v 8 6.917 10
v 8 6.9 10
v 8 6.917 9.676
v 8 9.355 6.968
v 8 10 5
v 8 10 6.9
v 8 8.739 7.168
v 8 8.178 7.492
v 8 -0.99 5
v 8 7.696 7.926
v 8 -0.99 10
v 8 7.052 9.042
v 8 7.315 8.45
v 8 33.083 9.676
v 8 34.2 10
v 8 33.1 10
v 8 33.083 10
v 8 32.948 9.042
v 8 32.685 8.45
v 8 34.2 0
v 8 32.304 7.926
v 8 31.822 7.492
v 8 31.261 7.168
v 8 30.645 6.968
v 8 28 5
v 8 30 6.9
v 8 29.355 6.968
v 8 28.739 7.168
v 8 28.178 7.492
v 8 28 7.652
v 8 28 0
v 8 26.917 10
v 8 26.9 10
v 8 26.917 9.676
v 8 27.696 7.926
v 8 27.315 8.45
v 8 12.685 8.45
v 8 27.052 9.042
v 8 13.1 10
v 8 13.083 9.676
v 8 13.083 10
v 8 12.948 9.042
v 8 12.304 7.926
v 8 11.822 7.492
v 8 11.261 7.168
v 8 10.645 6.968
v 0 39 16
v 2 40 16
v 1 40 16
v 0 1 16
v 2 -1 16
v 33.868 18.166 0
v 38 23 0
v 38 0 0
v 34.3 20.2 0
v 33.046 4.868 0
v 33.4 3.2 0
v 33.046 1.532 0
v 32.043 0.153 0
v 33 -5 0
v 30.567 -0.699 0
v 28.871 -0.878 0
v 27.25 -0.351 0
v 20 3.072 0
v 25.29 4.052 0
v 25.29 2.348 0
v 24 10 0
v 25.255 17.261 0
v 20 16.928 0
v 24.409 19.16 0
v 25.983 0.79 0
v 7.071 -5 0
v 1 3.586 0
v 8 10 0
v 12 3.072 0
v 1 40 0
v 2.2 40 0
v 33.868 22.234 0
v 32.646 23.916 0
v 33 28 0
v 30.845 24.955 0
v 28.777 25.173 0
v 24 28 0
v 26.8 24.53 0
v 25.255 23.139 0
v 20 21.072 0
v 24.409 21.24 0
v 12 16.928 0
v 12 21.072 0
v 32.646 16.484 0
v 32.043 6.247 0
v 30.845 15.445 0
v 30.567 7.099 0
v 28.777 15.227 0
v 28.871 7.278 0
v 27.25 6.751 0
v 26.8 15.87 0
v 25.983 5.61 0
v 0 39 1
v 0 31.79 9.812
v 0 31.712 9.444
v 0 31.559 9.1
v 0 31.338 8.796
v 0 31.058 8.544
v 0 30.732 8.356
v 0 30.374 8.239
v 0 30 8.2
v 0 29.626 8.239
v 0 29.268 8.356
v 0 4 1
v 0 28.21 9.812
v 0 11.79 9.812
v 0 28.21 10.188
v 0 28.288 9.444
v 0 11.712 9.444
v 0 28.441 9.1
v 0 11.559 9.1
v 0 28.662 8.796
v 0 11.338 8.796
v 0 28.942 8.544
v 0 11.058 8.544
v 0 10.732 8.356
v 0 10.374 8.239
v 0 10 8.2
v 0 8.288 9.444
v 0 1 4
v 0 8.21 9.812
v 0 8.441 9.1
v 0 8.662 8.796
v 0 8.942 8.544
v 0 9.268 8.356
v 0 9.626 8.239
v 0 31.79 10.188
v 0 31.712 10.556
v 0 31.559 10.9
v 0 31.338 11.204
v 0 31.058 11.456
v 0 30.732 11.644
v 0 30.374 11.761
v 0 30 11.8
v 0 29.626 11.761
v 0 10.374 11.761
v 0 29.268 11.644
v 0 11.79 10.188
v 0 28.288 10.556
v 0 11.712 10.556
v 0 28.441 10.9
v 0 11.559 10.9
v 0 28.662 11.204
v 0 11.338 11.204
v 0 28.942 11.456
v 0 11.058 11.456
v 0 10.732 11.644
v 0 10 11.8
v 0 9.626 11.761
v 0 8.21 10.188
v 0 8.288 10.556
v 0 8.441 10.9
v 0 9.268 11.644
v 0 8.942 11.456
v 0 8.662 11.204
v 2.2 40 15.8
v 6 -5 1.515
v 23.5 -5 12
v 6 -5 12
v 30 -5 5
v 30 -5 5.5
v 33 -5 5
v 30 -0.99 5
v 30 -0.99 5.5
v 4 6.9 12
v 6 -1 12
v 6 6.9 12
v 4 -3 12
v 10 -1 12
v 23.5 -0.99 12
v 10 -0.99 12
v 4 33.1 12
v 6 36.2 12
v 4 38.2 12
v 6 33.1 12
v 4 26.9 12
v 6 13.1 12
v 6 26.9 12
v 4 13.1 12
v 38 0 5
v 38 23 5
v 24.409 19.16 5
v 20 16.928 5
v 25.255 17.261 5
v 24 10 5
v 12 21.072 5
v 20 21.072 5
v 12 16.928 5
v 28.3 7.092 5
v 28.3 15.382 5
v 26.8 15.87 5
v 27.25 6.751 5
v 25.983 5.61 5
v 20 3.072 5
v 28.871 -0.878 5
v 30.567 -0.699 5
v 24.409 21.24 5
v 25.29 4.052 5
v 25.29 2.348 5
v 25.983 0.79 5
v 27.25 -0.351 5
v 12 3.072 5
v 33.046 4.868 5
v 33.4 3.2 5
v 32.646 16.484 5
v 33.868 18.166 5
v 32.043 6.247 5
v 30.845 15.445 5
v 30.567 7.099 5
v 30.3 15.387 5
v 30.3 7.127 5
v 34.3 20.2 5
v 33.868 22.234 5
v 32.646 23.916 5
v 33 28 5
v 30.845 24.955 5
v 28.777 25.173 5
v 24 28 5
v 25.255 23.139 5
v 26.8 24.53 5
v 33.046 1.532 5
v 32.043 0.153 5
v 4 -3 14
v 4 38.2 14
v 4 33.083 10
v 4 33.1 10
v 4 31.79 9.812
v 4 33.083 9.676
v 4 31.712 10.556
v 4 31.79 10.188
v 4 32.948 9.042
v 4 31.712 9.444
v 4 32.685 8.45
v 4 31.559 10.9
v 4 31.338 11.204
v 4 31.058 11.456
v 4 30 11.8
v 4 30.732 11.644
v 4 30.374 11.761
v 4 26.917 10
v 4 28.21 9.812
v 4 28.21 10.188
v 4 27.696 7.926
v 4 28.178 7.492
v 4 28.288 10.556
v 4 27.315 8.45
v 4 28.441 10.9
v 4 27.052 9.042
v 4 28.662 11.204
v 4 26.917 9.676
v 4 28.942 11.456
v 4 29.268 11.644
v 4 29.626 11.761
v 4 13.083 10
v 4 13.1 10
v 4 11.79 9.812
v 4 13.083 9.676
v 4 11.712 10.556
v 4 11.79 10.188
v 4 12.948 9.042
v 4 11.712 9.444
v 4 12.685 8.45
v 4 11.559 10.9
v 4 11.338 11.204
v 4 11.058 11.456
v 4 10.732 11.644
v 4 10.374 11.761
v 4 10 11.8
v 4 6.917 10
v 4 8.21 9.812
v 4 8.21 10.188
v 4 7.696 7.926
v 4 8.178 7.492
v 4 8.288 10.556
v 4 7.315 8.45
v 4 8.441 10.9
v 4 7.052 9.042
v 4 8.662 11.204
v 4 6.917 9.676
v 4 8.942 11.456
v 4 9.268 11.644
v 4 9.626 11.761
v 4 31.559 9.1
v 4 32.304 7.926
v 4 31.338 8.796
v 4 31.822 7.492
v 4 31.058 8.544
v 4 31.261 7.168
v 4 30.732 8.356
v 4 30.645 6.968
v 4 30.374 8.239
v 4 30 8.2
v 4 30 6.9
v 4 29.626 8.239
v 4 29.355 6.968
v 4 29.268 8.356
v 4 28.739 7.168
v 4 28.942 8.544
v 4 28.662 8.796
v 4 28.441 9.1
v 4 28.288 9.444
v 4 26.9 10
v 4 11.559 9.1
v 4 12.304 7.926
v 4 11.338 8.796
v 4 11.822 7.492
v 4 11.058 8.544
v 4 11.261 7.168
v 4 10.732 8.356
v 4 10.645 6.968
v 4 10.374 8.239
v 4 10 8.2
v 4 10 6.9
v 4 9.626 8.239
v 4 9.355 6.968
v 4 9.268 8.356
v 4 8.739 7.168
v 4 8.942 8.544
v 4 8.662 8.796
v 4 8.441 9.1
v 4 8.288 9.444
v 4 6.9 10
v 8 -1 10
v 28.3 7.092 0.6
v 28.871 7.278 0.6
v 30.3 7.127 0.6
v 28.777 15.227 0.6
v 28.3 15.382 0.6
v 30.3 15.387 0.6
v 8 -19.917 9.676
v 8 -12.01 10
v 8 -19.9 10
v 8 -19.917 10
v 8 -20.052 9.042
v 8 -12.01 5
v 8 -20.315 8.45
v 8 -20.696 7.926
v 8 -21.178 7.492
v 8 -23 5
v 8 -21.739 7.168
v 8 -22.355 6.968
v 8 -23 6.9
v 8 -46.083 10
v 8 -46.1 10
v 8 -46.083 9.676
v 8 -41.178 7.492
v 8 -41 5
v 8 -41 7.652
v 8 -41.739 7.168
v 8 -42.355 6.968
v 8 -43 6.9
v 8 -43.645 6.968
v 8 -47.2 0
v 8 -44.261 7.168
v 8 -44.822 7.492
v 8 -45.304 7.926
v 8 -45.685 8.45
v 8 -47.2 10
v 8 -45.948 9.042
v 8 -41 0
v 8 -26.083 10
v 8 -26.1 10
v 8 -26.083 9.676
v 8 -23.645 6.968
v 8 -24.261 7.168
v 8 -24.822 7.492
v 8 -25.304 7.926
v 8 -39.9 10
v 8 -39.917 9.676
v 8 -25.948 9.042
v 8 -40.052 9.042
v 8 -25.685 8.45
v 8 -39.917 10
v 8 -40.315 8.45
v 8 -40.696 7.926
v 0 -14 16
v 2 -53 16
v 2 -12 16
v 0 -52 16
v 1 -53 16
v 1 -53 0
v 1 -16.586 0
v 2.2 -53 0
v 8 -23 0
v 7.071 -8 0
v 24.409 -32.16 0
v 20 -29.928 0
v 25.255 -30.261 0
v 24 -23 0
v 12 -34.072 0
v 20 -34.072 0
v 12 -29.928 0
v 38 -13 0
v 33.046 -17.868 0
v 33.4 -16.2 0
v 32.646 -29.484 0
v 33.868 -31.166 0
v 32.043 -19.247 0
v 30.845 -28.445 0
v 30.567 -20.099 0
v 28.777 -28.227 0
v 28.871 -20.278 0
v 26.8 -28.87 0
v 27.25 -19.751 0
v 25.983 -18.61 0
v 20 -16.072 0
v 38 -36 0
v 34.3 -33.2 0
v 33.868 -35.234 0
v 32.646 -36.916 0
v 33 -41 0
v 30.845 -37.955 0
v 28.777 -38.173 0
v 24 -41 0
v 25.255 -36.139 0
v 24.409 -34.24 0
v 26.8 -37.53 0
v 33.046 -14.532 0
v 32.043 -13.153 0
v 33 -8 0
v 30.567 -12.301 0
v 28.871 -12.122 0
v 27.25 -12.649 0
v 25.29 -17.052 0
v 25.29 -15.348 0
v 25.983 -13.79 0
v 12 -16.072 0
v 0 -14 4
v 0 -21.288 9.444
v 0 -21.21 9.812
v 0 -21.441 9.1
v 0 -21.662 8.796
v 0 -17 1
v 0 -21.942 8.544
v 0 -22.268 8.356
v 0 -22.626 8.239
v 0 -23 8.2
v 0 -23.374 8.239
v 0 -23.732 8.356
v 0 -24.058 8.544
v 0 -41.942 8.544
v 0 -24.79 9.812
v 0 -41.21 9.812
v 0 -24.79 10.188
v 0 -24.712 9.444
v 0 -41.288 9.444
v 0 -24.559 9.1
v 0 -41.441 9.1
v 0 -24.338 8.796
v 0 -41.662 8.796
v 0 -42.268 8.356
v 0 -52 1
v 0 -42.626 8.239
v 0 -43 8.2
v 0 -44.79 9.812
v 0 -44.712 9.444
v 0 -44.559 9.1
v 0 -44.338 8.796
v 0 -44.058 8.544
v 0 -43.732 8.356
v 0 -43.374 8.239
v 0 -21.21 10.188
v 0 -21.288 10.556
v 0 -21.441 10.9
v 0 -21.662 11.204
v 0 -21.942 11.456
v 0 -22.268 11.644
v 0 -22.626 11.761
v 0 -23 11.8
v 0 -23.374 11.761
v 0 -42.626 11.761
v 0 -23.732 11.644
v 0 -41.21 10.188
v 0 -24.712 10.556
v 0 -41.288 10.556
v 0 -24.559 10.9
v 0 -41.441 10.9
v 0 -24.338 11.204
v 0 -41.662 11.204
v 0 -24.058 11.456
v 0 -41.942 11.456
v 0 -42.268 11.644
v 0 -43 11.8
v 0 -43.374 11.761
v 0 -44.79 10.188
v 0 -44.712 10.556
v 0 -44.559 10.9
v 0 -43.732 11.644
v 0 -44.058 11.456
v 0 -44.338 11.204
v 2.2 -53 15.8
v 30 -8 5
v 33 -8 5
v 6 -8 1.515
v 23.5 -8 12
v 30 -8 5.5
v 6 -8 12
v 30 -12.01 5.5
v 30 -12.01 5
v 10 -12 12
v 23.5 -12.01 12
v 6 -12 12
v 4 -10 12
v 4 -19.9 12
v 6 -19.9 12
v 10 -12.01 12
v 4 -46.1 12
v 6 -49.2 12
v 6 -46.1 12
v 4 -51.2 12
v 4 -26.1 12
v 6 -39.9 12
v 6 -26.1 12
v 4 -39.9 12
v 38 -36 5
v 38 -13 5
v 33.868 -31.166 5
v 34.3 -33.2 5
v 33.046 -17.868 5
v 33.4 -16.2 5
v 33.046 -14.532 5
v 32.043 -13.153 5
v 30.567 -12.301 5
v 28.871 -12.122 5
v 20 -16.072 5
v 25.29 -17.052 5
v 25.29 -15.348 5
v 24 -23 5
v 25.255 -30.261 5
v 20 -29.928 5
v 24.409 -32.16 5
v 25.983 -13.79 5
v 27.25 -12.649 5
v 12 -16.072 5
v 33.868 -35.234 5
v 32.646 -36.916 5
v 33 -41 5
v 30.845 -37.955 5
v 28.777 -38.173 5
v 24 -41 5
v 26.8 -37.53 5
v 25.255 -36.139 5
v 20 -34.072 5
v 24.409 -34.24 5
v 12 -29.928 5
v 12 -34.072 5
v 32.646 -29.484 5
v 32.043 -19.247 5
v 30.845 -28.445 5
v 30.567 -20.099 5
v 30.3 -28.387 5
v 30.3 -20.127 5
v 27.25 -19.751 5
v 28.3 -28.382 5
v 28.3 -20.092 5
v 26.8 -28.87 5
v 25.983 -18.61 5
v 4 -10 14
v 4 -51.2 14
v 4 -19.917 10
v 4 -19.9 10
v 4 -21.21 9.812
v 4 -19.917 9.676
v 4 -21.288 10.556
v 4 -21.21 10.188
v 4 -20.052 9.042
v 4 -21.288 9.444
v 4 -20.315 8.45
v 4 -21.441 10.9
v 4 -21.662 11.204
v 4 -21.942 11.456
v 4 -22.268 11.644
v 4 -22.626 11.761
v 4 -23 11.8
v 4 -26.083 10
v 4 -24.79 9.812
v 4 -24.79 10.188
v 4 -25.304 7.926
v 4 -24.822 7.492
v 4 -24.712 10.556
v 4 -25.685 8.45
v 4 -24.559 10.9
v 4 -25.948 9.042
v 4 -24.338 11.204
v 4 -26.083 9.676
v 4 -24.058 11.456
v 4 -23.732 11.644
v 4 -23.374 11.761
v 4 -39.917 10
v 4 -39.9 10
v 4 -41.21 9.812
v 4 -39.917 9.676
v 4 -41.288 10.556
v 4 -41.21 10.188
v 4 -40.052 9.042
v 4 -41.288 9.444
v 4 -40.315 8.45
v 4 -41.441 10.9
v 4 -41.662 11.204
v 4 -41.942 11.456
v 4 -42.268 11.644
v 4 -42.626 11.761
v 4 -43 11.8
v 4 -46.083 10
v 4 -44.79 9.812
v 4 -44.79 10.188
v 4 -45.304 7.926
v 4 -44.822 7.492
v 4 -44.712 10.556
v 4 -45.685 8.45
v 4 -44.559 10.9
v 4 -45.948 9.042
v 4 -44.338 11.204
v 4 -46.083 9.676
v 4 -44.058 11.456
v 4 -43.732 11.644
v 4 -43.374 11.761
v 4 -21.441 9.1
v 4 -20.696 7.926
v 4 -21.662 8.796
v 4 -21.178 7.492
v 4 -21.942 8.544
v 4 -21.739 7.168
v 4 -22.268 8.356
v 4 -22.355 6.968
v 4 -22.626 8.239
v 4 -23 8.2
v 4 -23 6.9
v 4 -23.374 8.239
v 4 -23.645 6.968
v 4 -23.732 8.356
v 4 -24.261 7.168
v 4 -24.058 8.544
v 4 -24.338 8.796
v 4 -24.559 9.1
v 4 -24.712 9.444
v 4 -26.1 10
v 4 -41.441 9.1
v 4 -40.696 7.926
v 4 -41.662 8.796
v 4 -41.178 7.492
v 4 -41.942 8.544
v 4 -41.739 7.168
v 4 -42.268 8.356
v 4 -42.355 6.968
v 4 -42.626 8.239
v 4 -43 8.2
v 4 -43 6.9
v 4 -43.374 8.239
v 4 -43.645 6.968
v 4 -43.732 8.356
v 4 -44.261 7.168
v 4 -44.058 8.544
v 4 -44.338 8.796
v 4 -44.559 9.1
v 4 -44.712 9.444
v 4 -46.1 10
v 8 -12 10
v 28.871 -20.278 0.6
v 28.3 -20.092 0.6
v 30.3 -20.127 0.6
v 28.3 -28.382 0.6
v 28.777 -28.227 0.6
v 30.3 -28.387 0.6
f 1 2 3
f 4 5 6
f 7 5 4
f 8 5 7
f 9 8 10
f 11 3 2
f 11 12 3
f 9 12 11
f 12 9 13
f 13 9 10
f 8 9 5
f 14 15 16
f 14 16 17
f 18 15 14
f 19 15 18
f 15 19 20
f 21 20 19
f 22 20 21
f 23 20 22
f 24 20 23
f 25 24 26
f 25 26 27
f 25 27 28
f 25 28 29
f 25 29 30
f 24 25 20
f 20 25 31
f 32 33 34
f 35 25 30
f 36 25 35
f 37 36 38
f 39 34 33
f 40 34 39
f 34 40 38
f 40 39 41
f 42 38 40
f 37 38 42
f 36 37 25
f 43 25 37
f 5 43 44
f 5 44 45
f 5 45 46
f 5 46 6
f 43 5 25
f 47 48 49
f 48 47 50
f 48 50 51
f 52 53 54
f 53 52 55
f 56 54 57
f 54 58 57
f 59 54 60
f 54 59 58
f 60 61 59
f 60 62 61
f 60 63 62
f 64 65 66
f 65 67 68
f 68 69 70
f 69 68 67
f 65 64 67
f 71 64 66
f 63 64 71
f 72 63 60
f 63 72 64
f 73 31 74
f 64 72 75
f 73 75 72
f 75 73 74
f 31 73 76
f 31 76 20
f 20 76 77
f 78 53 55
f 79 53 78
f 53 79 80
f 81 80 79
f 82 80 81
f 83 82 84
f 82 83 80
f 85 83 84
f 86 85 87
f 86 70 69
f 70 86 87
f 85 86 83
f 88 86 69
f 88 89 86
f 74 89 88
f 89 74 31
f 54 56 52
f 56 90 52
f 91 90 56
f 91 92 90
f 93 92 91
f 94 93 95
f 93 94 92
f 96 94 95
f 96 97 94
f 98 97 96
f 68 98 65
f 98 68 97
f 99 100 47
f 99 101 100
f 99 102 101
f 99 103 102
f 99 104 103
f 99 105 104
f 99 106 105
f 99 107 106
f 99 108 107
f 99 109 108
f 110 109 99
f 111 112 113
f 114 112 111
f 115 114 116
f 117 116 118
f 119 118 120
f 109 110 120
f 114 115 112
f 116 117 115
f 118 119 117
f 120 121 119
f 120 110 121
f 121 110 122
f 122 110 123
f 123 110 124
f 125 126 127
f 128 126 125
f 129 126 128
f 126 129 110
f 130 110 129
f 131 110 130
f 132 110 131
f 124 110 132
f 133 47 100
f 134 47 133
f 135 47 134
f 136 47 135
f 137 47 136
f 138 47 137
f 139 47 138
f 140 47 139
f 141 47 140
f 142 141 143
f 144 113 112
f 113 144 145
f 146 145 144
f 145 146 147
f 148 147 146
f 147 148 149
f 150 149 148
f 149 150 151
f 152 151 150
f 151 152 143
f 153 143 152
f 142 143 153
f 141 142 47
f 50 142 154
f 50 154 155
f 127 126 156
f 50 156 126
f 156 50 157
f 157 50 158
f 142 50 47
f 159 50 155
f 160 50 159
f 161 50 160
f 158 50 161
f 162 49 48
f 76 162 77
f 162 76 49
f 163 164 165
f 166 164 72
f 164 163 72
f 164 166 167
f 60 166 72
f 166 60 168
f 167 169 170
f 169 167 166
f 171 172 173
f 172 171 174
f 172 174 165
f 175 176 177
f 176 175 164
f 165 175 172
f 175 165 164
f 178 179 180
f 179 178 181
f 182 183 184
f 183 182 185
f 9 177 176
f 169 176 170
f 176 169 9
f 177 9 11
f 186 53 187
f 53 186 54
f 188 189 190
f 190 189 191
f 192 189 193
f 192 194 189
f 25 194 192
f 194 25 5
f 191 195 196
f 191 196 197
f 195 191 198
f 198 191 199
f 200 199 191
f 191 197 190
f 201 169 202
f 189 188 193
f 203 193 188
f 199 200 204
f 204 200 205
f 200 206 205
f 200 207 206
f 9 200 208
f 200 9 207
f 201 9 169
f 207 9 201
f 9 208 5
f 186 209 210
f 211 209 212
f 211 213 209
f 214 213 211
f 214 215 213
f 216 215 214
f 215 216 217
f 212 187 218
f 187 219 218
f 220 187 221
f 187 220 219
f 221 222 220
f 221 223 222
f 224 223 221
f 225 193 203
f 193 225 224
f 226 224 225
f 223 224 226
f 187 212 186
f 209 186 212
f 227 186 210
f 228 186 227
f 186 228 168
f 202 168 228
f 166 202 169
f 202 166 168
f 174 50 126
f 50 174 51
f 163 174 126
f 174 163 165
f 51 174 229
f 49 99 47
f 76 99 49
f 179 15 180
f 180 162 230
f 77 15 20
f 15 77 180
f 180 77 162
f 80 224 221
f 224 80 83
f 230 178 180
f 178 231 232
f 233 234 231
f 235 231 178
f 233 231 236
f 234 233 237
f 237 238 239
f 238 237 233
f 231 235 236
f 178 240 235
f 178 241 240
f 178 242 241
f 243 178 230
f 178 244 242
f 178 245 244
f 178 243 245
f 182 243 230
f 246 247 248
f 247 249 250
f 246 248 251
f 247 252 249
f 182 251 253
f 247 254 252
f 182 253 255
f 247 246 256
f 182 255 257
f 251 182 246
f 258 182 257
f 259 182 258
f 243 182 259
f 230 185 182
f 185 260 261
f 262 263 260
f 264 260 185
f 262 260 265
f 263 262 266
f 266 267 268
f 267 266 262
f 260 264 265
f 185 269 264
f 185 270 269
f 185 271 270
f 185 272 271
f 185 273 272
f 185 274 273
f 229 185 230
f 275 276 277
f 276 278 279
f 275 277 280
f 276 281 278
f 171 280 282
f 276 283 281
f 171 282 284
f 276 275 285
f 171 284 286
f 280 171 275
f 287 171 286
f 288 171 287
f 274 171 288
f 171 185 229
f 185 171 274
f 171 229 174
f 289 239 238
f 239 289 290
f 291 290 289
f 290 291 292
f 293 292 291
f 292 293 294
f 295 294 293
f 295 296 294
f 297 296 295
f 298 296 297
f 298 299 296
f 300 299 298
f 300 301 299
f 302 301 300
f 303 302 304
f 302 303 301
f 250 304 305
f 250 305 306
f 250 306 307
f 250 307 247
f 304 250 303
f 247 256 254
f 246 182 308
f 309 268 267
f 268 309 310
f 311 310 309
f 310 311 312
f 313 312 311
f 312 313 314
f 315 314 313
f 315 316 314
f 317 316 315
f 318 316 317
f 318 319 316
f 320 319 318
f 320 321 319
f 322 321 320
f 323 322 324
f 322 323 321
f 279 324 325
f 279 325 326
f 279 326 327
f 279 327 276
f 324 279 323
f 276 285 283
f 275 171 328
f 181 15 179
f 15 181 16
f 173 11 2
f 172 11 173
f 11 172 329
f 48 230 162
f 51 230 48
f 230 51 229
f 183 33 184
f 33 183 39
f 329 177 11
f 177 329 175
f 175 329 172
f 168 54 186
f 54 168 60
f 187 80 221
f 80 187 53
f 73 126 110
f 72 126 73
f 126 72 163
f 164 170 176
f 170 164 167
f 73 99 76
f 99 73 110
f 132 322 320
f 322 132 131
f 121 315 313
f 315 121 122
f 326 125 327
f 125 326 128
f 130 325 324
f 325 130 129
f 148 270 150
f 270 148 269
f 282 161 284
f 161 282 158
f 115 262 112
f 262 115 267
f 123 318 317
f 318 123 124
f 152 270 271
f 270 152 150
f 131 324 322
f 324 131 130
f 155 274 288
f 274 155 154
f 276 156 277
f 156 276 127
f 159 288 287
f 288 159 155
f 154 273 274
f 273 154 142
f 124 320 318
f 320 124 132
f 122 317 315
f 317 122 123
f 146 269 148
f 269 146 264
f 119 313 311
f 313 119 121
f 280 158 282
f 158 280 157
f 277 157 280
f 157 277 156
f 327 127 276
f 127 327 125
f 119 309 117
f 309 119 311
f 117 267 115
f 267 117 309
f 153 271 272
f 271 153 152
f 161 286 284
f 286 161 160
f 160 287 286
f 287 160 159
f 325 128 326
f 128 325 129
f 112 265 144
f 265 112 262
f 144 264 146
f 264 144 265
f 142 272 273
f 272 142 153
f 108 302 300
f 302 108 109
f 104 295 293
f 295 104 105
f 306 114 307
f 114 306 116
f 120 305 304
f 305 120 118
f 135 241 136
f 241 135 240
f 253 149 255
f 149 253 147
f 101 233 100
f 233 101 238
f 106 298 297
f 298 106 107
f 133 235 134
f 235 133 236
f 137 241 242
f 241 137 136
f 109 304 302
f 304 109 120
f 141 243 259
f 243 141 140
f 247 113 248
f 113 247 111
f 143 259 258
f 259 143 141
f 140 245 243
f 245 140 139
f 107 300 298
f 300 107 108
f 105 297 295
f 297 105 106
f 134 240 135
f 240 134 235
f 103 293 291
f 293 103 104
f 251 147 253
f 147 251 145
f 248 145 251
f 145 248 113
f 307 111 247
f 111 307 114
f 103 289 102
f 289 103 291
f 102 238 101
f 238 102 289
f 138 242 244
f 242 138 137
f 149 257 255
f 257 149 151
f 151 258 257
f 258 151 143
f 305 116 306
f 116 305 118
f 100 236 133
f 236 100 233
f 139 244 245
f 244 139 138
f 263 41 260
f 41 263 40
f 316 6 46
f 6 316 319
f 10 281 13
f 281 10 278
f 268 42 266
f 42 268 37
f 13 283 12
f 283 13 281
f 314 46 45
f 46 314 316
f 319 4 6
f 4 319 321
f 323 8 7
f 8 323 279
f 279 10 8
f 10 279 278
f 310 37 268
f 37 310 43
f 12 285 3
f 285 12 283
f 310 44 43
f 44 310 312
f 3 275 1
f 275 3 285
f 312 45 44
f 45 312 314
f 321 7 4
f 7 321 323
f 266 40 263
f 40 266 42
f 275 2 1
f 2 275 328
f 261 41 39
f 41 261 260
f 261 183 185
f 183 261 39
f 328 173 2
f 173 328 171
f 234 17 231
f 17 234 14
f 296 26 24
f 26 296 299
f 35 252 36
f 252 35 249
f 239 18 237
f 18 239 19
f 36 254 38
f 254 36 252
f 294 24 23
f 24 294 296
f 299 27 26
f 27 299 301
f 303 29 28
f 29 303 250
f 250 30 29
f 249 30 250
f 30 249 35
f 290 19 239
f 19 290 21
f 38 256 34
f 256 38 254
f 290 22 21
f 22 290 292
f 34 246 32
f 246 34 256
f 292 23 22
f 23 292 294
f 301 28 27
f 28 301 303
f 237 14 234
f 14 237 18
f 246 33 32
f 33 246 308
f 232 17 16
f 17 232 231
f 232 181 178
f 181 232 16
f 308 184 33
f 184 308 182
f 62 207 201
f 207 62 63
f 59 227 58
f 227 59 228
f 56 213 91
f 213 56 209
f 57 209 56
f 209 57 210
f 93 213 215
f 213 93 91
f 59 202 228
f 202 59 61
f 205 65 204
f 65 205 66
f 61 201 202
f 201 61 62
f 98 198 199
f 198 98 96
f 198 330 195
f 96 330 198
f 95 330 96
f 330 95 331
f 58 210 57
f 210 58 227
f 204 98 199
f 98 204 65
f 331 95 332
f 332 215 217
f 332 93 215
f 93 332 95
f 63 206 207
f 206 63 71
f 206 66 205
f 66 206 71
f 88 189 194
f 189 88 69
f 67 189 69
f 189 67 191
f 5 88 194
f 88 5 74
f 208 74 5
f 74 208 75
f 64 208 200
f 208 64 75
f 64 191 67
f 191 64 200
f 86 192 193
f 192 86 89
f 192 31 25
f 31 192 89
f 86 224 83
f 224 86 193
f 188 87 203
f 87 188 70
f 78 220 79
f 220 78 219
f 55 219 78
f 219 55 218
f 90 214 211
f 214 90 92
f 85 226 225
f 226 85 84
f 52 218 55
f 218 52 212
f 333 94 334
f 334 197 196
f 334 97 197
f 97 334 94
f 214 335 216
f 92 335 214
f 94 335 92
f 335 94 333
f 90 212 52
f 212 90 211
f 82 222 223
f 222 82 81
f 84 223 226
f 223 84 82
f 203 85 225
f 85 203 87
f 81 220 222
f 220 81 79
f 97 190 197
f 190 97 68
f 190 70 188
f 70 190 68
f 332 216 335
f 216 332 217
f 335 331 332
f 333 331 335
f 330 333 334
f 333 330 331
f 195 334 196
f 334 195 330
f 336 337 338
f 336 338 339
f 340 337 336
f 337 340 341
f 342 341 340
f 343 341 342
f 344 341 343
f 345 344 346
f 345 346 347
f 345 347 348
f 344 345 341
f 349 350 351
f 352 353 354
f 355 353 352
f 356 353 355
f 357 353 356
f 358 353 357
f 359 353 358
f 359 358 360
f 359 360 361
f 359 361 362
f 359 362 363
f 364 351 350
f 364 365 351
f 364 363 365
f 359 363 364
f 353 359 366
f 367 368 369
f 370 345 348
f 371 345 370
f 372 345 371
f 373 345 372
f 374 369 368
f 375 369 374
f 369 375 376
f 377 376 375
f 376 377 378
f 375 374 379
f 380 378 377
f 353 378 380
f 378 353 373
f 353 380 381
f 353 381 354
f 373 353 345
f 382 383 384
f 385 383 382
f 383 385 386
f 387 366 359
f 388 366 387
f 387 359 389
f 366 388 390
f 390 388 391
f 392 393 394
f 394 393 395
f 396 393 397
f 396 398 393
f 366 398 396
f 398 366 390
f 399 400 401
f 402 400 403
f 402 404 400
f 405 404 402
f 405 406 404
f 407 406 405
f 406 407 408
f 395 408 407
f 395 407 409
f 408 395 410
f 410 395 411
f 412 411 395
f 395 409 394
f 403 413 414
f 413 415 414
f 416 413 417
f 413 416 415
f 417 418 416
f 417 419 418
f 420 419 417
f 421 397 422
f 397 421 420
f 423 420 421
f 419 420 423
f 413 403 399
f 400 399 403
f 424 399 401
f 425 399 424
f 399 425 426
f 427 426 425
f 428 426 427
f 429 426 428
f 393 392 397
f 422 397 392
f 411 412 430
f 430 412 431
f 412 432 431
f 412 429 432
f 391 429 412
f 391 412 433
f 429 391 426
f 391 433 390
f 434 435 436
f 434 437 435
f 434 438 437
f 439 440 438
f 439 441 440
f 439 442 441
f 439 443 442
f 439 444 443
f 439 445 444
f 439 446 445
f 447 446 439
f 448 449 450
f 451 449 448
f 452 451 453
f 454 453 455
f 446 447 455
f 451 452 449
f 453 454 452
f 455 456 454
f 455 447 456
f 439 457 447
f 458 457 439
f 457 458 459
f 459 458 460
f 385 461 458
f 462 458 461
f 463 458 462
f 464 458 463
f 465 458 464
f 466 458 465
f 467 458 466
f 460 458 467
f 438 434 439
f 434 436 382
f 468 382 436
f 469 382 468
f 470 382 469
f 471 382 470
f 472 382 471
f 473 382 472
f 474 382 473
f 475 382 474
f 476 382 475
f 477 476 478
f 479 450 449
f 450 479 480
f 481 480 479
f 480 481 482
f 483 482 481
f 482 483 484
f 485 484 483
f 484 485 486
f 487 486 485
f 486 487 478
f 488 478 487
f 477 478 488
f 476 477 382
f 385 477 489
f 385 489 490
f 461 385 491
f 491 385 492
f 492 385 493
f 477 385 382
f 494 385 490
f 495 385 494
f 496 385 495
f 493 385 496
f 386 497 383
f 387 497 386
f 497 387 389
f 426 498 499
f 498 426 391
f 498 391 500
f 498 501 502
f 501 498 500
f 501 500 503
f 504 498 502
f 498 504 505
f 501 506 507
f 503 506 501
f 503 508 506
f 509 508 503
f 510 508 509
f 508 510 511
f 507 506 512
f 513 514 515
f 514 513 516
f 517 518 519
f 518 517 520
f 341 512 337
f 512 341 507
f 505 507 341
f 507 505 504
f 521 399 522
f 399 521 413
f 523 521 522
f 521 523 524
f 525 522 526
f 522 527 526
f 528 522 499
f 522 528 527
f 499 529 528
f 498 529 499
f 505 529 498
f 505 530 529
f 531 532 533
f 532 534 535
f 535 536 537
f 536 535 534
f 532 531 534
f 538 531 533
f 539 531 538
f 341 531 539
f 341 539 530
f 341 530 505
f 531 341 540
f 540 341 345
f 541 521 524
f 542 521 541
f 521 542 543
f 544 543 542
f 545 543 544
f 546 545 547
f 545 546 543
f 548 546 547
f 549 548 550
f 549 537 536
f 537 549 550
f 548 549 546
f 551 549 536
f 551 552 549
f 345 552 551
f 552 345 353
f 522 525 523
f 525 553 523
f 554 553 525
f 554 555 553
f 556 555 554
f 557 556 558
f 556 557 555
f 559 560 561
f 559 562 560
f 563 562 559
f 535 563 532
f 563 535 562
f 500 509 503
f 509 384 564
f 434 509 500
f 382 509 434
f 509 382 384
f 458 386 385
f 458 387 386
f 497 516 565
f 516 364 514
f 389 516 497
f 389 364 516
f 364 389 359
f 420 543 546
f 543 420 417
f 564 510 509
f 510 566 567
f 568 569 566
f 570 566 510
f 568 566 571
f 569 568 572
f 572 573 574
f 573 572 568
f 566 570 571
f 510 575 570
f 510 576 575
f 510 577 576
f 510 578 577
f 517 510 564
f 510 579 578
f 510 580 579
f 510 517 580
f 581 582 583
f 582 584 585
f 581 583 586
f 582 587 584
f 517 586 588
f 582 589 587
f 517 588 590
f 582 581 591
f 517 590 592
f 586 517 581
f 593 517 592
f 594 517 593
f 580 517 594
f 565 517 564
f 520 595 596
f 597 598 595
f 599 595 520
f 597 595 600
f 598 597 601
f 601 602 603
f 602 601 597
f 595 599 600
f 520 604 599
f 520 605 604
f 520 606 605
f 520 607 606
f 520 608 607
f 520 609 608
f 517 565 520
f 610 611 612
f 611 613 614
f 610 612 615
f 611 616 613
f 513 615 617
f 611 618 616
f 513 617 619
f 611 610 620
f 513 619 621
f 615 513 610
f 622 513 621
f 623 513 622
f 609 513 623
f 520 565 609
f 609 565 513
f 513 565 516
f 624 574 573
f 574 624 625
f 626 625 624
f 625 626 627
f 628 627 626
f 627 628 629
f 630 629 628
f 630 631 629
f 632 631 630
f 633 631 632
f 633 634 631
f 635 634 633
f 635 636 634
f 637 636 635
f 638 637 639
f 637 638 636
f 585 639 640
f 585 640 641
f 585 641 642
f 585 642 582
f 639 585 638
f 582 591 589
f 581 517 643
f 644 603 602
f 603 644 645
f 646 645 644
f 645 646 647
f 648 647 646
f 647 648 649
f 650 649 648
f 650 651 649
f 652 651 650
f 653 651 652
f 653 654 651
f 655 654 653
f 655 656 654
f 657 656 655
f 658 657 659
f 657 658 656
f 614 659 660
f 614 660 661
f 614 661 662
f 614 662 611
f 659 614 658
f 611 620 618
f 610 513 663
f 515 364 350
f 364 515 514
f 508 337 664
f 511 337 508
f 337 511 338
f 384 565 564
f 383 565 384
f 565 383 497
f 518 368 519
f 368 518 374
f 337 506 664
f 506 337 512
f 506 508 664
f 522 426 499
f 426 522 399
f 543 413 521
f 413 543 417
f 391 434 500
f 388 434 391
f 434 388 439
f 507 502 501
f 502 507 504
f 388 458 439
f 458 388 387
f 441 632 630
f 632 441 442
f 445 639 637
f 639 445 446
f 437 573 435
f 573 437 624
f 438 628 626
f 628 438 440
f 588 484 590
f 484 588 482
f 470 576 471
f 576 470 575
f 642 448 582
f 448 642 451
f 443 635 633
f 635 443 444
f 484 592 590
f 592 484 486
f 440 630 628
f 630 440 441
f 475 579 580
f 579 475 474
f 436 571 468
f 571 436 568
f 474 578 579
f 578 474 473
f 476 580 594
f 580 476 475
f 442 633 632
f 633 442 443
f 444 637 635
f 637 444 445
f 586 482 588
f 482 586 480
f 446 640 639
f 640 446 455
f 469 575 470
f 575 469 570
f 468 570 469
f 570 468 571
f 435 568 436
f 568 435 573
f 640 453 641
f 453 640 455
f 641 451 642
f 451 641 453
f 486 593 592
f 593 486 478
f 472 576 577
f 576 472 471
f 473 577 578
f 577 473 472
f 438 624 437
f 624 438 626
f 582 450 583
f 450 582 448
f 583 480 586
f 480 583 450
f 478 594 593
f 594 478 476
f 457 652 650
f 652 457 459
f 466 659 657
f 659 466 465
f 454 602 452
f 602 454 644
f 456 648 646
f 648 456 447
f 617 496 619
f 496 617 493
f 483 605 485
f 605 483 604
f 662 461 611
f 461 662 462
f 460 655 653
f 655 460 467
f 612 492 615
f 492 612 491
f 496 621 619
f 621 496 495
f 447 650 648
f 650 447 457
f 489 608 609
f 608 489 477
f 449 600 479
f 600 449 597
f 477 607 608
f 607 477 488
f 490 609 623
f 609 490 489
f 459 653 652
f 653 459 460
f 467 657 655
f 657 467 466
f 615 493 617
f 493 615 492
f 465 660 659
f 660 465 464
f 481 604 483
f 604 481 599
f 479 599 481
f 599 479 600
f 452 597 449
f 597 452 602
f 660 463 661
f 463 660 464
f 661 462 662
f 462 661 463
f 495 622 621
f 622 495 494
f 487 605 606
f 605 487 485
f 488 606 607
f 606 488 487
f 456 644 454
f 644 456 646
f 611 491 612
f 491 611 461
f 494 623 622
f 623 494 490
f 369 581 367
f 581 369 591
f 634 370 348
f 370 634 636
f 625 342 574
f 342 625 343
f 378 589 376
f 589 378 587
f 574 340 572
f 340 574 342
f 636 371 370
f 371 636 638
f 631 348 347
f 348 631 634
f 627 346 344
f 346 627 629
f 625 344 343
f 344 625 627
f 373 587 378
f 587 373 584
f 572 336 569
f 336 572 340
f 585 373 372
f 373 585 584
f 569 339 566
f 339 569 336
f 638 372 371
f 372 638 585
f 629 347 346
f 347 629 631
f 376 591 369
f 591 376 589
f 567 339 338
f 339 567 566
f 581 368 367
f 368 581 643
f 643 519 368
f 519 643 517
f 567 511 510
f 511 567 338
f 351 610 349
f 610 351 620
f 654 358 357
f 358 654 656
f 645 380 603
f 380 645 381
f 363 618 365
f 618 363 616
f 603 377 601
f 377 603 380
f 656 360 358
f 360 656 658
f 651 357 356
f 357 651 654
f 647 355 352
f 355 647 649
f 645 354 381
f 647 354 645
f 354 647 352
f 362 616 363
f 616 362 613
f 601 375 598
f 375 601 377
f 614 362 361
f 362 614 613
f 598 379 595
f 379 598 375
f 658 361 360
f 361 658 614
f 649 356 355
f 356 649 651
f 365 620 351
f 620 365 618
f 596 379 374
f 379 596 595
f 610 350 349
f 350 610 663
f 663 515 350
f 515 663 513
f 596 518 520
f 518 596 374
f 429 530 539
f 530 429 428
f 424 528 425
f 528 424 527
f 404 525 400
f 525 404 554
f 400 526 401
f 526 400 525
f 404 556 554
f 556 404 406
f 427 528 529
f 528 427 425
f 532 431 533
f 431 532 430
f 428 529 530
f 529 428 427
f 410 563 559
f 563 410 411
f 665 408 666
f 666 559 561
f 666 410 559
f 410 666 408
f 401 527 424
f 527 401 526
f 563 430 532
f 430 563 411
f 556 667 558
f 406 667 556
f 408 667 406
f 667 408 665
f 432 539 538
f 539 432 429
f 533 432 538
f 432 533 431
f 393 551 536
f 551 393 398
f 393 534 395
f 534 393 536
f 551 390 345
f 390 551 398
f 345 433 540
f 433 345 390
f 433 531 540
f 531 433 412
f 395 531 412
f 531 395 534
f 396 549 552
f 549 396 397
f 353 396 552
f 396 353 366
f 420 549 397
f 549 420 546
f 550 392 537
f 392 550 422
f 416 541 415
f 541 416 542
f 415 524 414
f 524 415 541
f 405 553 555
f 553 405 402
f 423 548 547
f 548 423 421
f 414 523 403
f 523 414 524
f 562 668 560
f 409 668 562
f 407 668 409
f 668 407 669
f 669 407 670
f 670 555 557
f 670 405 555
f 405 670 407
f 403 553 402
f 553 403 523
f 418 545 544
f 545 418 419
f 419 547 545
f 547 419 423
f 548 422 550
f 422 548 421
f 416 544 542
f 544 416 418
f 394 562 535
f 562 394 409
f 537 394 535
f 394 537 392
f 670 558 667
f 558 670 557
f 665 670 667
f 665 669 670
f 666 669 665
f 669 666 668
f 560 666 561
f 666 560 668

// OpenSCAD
// PRUSA iteration3
// Z axis top holder
// GNU GPL v3
// Josef Průša <iam@josefprusa.cz> and contributors
// http://www.reprap.org/wiki/Prusa_Mendel
// http://prusamendel.org


module z_top_base(){
 translate([0,-5,0]) cube([8,45,16]); // plate touching the base
 translate([0,-5,0]) cube([30,4.01,12]); // plate touching the base
 translate([0,-5,0]) cube([38,45,5]); // plate touching the base   
}

module z_top_fancy(){
 // Corner cutouts
 translate([0.5,0.5,0])         rotate([0,0,-45-180]) translate([-15,0,-1]) cube([30,30,51]);    
 translate([0.5,40-0.5,0])      rotate([0,0,-45+90])  translate([-15,0,-1]) cube([30,30,51]);  
 
    
 translate([-13,40+5+10.2,0])   rotate([0,0,-45-0])   translate([0,0,-1])   cube([30,30,51]); // frame side angle
 translate([8,28,0]) translate([0,0,-1]) cube([50,50,51]);       

 translate([4,0,12]) rotate([0,0, 0])    translate([0,-5,0]) cube([30,50,30]);          
 translate([6,0,12]) rotate([0,-45, 0])  translate([0,-5,0]) cube([30,50,30]);
 translate([8,4,10]) rotate([0,-45, 0])  translate([0,-5,0]) cube([30,50,30]);

 translate([38-2.5,-5+2.5,0])   rotate([0,0,-45-90]) translate([-15,0,-1]) cube([30,30,51]);         
 translate([35,26,0])           rotate([0,0,-45])    translate([-15,0,-1]) cube([30,30,51]); // outer corner
 translate([0,0,5])             rotate([45+180,0,0]) rotate([0,0,-45+90])  translate([0,0,-15]) cube([30,30,30]);

 // Stiffner cut out
 translate([30,0,5.5]) rotate([0,-45,0]) translate([0,-5,0]) cube([30,50,30]);
 //easy cleanup fix
 translate([0.5,0,0.5]) rotate([0,45,0]) translate([-2.5,0,-5]) cube([5,40,5]);
}

module z_top_holes(){
     // Screw holes frame
     translate([-1,10,10])      rotate([0,90,0]) cylinder(h = 20, r=1.8, $fn=30);
     translate([-1,10+20,10])   rotate([0,90,0]) cylinder(h = 20, r=1.8, $fn=30);
    

    // Screw heads
    translate([4,10,10]) rotate([0,90,0]) cylinder(h = 20, r=3.1, $fn=30);
    translate([4,10-3.1,10]) cube([10,6.2,10]);
    translate([4,10+20,10])  rotate([0,90,0]) cylinder(h = 20, r=3.1, $fn=30);
    translate([4,10+20-3.1,10]) cube([10,6.2,10]);

    // Z rod holder
    translate([25+4.3,3.2,-1]) rotate([0,0,0]) cylinder(h = 50, r=4.1, $fn=15);

    
    
    // odlehceni A
    translate([16,10,-1]) rotate([0,0,0]) cylinder(h = 50, r=8, $fn=6); // odlehceni
    translate([16,28,-1]) rotate([0,0,0]) cylinder(h = 50, r=8, $fn=6); // odlehceni
    
    translate([25+4.3,3.2+17,-1]) rotate([0,0,0]) cylinder(h = 50, r=5, $fn=15); // screw hole

    translate([25+4.3-1,3,0.6]) cube([2,15,7]); // it's bit up because it helps with printing
 
}

module z_top_right(){
    difference(){
        z_top_base();
        z_top_fancy();
        z_top_holes();
    }
}

module z_top_left(){
    translate([0,-13,0]) mirror([0,1,0]) 
    difference(){
        z_top_base();
        z_top_fancy();
        z_top_holes();
    }
}

// Final part
z_top_left();
z_top_right();
